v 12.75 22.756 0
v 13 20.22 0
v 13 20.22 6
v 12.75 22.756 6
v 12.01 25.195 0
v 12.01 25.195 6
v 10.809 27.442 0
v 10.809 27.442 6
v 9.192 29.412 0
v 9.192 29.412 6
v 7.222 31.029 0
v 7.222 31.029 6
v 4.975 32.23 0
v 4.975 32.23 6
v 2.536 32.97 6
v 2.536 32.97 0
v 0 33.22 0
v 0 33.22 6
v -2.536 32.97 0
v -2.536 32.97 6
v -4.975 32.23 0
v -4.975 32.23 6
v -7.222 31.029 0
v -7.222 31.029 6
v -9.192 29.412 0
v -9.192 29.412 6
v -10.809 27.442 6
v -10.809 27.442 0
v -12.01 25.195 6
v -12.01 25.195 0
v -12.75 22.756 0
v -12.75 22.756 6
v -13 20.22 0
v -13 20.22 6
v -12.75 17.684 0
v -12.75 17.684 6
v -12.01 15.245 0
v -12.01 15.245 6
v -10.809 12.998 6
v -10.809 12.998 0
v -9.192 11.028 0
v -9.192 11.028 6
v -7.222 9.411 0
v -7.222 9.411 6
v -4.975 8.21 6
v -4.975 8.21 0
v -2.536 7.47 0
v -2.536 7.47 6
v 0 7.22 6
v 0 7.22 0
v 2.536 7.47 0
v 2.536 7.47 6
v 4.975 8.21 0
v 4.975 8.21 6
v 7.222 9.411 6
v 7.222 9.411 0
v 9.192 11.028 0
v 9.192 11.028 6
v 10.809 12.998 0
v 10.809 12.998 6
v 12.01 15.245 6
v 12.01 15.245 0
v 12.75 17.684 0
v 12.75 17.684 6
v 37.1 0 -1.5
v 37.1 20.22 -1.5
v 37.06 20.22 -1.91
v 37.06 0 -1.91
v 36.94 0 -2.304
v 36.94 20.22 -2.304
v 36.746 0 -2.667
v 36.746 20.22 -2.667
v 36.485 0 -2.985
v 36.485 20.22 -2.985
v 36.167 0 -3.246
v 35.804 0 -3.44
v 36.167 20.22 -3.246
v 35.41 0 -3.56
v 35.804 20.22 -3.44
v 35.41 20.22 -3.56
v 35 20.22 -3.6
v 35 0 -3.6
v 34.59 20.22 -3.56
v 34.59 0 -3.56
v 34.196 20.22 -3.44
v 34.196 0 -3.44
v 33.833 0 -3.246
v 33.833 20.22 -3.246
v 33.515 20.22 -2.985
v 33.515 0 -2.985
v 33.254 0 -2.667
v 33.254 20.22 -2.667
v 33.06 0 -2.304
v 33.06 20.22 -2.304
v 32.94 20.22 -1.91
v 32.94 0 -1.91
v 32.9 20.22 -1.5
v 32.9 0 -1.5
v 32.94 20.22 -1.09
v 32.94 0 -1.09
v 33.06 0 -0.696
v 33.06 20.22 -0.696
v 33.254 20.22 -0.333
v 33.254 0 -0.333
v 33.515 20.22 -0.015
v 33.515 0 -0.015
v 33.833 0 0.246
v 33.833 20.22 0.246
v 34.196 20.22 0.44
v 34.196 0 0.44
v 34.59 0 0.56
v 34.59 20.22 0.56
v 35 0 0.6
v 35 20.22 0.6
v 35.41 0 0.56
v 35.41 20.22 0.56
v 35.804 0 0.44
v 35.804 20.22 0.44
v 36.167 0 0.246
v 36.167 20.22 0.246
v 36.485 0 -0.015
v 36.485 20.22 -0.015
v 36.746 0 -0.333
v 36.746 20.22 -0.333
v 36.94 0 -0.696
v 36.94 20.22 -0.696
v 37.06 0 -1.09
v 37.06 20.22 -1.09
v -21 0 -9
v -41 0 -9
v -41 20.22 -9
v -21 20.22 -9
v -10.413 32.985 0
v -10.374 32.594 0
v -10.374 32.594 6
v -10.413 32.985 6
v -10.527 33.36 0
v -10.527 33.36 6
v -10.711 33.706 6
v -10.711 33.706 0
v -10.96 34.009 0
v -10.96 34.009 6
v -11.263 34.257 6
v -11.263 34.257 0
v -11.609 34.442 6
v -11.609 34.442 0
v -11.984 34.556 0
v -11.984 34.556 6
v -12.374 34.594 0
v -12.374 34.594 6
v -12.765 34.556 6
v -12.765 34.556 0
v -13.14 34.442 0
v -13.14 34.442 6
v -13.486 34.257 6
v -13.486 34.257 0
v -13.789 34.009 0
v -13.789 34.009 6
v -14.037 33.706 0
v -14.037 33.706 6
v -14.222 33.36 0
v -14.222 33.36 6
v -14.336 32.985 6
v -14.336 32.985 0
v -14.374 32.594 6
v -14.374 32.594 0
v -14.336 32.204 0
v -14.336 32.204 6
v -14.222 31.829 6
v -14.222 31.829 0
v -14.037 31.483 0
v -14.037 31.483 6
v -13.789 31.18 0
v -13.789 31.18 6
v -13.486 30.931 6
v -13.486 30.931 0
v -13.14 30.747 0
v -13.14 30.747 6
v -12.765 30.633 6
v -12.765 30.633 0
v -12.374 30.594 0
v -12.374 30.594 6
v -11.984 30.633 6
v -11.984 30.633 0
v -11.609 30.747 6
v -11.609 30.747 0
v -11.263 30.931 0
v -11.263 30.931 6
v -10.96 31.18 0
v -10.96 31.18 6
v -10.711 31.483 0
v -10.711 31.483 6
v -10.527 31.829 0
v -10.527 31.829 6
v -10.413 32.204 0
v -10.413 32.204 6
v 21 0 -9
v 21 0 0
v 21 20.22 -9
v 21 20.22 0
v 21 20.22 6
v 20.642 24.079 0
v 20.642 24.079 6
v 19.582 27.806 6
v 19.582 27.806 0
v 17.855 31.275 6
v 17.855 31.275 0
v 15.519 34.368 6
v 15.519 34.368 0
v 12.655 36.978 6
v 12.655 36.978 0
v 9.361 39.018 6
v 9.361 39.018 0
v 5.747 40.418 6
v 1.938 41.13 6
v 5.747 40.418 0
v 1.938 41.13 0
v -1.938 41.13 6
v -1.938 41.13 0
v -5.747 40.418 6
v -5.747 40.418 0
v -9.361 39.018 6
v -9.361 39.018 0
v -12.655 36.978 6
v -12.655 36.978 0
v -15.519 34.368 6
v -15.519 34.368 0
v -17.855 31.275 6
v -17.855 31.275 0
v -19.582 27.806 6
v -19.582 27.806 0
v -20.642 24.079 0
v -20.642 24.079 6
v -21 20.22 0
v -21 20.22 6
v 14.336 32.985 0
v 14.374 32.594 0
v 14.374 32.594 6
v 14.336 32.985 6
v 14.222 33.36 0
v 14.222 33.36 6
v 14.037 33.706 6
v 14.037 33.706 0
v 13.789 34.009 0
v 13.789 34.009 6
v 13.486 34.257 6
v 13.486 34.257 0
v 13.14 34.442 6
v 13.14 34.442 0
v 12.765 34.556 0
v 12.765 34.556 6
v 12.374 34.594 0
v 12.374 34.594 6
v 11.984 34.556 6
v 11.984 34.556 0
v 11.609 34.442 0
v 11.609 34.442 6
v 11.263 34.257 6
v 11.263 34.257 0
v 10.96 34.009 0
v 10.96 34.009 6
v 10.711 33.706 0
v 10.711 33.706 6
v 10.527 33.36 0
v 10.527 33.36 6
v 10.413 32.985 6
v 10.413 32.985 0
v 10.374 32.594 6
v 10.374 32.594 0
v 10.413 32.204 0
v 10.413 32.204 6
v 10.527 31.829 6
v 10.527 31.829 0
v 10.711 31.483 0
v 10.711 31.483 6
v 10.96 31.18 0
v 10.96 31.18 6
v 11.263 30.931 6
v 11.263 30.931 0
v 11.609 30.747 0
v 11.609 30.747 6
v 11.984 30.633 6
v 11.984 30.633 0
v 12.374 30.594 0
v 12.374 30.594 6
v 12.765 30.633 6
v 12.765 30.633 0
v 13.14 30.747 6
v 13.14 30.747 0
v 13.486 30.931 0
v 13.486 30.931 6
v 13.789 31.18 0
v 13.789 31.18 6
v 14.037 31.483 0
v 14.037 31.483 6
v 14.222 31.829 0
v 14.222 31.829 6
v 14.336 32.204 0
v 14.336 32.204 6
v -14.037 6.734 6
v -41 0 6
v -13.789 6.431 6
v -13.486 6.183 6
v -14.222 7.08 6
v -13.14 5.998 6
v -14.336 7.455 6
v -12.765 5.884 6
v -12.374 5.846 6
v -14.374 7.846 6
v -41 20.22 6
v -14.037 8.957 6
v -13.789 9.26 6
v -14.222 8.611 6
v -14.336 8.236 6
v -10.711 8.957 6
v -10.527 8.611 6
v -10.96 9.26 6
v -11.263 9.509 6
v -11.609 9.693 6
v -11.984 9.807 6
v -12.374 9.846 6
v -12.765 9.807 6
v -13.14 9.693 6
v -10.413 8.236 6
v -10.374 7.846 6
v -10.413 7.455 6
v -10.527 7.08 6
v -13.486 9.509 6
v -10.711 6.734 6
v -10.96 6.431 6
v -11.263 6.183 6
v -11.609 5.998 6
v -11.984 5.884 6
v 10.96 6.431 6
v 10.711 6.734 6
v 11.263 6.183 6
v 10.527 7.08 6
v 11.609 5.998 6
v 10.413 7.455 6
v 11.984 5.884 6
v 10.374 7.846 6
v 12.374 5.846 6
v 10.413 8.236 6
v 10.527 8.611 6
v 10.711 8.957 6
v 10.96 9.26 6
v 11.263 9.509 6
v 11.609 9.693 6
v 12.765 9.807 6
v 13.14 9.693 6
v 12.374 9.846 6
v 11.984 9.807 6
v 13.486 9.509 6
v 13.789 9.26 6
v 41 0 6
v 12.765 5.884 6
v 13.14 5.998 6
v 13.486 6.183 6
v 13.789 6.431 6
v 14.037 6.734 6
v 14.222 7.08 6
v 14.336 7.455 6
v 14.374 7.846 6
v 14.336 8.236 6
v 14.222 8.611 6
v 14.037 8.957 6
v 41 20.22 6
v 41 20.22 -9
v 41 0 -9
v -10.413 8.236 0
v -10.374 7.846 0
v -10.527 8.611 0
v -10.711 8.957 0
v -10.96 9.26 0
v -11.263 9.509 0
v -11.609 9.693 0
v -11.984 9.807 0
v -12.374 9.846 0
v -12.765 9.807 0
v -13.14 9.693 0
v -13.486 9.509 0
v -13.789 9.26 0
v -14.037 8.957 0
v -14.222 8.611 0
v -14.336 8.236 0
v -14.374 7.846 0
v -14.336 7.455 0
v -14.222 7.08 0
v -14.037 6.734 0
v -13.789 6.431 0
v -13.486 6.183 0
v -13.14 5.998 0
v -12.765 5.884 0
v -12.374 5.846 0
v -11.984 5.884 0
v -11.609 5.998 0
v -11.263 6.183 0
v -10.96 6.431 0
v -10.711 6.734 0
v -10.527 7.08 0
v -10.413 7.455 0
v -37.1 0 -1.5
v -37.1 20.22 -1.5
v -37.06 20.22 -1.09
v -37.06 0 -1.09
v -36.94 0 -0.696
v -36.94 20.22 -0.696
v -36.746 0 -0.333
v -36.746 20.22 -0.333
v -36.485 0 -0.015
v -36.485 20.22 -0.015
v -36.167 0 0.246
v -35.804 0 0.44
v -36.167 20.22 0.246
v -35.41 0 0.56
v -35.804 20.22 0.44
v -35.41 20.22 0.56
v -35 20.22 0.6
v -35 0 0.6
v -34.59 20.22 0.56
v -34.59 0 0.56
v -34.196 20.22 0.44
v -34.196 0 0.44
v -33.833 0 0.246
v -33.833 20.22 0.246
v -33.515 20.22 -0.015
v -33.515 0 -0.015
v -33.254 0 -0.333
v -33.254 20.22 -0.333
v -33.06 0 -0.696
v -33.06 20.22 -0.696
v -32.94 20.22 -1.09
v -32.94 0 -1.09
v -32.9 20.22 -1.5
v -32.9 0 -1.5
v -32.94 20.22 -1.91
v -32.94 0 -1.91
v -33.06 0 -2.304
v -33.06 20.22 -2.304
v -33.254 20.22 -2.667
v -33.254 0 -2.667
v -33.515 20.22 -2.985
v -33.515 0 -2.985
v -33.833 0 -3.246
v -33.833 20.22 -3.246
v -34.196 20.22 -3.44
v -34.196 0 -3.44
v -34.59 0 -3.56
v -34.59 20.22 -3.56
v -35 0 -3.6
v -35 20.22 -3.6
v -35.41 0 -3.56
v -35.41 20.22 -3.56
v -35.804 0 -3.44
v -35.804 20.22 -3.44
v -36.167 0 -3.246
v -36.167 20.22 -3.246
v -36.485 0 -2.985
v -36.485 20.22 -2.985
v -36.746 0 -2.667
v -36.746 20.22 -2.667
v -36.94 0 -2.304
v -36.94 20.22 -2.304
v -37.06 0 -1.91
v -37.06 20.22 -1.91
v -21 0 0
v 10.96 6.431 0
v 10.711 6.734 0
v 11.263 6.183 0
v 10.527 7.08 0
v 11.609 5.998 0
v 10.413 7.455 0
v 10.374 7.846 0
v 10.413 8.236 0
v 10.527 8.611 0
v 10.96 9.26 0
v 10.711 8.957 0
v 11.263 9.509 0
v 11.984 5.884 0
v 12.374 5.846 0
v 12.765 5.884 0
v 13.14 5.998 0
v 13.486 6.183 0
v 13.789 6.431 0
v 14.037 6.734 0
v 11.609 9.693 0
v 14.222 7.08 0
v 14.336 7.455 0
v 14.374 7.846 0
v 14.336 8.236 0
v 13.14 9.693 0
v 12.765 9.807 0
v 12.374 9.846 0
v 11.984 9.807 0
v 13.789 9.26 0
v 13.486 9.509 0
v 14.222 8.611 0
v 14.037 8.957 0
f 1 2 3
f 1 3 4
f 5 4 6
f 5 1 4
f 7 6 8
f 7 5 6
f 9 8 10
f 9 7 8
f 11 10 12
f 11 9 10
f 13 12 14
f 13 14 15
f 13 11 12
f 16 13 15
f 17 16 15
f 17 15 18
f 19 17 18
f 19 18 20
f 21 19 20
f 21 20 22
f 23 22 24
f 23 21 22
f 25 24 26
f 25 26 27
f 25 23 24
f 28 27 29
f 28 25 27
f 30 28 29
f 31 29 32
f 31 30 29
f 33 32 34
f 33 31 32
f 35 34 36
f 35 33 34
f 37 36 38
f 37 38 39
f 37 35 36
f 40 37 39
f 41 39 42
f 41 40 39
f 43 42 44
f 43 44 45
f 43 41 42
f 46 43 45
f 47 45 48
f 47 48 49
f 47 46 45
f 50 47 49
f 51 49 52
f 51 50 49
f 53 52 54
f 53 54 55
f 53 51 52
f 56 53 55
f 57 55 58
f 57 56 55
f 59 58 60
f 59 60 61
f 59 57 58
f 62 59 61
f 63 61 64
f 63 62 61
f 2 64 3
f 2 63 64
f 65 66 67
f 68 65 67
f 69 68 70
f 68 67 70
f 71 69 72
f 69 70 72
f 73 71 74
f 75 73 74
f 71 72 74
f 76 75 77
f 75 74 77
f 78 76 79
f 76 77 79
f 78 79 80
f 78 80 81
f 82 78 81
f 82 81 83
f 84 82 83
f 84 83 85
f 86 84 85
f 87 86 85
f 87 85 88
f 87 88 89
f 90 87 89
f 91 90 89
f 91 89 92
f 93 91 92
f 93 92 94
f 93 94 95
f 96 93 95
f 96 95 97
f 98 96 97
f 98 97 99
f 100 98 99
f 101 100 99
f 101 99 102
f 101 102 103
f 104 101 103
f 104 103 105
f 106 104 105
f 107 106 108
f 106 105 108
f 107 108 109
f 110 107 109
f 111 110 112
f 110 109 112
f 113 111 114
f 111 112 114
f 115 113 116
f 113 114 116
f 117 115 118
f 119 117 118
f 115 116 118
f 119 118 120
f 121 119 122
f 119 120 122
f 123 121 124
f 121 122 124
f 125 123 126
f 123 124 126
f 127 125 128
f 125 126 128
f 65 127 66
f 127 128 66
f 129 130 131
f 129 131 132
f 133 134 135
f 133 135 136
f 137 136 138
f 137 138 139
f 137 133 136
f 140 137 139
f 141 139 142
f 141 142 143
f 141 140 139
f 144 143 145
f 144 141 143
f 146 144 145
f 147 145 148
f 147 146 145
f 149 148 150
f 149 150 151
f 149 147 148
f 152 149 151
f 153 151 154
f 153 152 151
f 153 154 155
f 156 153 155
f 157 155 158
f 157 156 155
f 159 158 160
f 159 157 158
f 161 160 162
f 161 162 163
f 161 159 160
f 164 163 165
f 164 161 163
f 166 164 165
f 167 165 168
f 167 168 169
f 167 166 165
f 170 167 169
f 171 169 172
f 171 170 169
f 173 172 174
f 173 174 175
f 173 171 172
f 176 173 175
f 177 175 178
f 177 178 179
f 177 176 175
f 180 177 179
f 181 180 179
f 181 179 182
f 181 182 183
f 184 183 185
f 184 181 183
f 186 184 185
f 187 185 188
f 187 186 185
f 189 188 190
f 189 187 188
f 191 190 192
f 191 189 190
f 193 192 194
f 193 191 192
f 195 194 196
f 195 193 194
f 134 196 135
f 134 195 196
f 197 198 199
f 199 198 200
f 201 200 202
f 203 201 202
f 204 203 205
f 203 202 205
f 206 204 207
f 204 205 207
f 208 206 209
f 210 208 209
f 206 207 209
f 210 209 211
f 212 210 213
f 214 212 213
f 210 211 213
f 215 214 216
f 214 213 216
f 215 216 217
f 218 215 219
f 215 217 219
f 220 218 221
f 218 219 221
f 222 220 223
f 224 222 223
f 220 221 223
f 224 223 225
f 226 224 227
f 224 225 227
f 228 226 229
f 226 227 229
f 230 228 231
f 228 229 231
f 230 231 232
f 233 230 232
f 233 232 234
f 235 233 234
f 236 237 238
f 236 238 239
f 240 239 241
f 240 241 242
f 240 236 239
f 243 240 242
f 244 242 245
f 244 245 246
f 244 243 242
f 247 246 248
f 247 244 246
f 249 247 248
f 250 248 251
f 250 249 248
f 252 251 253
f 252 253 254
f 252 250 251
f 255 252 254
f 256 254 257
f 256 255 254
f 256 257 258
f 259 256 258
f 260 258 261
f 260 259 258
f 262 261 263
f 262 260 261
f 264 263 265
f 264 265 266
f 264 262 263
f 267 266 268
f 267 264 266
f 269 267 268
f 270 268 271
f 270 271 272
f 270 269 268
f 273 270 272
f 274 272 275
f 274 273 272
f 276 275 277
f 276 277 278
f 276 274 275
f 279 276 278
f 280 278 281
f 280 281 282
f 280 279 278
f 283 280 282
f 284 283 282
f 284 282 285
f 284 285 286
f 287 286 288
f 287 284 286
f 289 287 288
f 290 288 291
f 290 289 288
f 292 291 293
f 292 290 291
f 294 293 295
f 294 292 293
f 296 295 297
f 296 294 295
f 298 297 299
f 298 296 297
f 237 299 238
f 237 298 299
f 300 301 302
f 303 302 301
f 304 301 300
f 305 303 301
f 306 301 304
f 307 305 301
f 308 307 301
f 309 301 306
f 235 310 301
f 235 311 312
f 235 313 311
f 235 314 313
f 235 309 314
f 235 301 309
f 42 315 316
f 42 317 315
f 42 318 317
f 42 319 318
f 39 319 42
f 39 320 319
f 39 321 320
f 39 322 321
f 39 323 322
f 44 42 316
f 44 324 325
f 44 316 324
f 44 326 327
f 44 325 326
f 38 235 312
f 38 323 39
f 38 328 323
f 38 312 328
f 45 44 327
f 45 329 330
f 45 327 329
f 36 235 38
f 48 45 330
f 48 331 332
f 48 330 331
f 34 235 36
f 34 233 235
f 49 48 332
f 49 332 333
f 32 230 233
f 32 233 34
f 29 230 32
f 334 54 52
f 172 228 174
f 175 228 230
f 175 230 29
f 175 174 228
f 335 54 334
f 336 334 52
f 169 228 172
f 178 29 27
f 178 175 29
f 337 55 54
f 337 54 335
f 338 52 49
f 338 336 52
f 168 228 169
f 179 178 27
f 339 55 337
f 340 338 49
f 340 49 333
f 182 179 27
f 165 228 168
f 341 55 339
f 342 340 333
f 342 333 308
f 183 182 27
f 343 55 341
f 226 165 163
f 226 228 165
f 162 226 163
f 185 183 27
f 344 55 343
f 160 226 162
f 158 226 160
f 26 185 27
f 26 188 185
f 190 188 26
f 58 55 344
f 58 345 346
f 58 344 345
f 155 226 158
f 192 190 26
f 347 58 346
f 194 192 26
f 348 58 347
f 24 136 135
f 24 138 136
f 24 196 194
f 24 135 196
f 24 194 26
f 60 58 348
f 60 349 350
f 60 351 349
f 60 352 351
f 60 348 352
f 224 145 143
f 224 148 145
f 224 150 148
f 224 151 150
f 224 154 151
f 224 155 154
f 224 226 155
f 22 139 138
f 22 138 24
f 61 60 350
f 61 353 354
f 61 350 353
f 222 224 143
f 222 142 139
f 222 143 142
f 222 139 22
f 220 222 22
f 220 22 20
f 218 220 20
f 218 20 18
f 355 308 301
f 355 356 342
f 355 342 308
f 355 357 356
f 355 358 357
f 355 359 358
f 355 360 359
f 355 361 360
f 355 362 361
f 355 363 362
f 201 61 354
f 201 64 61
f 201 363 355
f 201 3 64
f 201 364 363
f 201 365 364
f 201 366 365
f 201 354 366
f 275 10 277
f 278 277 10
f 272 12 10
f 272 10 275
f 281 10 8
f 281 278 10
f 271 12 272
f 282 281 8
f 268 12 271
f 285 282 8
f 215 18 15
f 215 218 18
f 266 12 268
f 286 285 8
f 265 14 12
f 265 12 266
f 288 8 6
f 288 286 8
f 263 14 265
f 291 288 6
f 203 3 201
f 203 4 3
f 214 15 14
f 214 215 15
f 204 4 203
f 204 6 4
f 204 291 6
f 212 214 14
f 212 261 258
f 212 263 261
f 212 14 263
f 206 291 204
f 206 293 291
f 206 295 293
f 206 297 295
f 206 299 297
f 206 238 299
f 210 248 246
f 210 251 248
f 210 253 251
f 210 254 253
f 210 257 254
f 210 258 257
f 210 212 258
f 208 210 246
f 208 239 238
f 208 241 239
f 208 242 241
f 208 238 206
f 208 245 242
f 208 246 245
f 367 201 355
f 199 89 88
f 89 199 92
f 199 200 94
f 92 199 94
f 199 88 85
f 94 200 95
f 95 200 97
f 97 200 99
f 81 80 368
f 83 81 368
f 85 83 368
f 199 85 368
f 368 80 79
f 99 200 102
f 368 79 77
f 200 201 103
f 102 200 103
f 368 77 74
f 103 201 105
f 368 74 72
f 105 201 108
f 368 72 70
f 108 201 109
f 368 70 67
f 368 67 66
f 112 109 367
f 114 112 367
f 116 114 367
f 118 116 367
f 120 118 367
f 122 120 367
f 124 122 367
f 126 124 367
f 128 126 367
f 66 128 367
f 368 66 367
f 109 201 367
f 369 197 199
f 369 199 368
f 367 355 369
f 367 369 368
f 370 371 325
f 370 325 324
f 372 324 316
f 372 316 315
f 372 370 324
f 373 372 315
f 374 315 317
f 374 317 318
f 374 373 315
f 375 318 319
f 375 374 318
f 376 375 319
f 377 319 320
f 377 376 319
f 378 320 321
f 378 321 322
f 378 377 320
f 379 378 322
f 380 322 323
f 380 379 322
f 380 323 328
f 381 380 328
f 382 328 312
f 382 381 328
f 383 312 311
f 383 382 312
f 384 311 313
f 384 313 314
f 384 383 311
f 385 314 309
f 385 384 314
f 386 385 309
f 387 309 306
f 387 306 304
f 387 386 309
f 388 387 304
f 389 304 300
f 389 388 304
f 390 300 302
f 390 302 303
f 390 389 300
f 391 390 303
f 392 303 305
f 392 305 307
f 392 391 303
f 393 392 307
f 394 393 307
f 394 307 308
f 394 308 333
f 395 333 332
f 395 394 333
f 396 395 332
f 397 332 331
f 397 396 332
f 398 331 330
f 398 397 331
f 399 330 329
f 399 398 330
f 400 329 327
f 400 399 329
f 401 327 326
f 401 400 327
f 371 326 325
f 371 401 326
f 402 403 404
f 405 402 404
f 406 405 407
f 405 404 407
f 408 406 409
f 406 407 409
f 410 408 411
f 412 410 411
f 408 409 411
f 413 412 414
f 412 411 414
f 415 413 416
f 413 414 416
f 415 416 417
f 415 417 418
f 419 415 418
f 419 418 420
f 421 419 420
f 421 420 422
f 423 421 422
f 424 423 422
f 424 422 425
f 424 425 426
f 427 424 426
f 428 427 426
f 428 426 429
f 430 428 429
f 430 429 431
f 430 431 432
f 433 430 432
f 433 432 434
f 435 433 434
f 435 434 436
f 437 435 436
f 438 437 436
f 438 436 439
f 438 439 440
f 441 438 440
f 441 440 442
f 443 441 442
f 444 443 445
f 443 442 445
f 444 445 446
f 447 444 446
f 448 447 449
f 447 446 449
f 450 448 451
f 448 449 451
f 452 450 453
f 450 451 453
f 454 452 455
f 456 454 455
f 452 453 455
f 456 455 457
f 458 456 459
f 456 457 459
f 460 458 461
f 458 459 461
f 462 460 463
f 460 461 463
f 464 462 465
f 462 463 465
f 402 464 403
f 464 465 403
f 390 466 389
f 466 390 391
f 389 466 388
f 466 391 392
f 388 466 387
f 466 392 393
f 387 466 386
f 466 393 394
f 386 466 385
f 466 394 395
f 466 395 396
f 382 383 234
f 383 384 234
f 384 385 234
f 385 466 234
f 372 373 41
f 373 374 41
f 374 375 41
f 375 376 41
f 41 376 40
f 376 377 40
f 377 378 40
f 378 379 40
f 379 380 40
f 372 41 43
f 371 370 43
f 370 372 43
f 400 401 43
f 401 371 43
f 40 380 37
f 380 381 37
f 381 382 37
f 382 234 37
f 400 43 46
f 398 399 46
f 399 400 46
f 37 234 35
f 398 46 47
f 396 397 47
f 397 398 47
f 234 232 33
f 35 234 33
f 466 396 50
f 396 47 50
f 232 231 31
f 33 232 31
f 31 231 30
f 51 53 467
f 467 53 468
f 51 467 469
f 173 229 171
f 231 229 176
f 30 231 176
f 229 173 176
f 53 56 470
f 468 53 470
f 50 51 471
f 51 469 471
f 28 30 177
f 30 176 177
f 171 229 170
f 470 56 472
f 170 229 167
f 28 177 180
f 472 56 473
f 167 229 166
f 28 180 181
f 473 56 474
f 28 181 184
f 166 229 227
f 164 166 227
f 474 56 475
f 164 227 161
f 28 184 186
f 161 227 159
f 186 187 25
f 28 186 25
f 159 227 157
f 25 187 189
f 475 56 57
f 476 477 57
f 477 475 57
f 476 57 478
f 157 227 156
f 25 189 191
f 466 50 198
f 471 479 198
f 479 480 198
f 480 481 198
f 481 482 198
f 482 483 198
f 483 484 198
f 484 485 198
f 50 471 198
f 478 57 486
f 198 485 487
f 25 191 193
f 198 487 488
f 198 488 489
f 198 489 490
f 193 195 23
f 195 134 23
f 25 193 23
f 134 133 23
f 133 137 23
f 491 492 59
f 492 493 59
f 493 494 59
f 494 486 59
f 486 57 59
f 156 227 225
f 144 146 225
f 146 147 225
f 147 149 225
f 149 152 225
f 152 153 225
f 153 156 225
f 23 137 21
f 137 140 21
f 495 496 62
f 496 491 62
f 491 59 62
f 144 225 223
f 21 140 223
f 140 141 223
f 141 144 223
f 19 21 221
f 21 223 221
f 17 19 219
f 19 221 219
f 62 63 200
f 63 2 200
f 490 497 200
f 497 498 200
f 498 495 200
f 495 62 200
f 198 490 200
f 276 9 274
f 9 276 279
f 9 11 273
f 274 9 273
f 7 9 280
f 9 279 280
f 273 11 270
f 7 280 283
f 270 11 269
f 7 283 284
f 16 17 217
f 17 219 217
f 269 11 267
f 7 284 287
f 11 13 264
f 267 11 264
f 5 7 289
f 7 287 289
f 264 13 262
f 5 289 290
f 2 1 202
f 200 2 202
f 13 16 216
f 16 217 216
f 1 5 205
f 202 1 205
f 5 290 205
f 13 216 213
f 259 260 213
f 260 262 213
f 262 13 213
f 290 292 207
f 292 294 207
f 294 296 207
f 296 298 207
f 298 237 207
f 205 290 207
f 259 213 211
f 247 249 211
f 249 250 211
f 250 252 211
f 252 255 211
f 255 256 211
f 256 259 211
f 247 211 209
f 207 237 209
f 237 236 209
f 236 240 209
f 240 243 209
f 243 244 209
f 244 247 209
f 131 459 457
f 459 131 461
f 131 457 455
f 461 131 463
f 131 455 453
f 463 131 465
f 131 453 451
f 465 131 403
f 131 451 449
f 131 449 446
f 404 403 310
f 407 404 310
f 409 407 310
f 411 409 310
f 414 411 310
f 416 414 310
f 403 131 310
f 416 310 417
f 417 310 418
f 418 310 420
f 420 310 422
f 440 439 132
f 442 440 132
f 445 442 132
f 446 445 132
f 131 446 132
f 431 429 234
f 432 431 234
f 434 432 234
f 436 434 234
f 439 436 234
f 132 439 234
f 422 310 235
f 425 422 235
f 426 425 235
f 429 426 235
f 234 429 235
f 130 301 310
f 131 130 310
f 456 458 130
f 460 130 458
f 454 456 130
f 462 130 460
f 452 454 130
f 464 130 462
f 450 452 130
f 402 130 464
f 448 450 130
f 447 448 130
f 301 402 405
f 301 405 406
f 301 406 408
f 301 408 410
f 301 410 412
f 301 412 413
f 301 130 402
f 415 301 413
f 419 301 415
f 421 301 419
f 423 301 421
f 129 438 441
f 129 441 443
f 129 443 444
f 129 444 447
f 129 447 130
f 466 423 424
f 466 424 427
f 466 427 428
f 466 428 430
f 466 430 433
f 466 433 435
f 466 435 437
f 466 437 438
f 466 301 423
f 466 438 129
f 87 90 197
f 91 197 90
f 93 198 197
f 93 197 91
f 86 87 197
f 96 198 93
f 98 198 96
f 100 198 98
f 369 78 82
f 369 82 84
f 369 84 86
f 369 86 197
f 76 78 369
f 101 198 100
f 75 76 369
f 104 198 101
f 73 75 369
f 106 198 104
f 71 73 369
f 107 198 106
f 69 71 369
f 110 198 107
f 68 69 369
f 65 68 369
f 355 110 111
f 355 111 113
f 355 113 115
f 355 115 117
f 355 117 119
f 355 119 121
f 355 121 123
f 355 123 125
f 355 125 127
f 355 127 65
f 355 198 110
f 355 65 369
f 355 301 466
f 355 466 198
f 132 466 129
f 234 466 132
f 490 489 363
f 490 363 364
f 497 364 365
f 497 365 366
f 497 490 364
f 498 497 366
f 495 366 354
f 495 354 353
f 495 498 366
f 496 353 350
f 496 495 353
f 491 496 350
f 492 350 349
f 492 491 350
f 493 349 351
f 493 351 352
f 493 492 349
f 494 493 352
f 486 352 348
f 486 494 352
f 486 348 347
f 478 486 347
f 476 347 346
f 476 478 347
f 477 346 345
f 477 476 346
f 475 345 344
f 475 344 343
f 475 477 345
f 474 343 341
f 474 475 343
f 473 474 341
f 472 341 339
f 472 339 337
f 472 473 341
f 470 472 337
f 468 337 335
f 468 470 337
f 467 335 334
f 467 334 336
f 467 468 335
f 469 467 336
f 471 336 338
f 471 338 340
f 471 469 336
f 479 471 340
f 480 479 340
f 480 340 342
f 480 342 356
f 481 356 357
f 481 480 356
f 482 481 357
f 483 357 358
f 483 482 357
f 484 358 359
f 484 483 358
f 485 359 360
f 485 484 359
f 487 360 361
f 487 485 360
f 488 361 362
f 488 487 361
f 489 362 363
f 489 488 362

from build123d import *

# Parameters (mm, degrees)
SKETCH_1_R          = 13
SKETCH_1_R_2        = 2
EXTRUDE_1_DEPTH     = 6
SKETCH_2_W          = 20
SKETCH_2_H          = 20.22
EXTRUDE_2_DEPTH     = 15
SKETCH_3_R          = 2.1
CUT_EXTRUDE_1_DEPTH = 47.936126811


with BuildPart() as part:
    # 草图1 → 凸台-拉伸1 (new body)
    with BuildSketch(Plane.XY):
        with BuildLine():
            Line((-21, 20.22), (-21, 0))
            Line((-21, 0), (21, 0))
            Line((21, 0), (21, 20.22))
            ThreePointArc((21, 20.22), (0, 41.22), (-21, 20.22))
        make_face()
        with Locations((0, 20.22)):
            Circle(SKETCH_1_R, mode=Mode.SUBTRACT)
        with Locations((-12.374368671, 32.594368671)):
            Circle(SKETCH_1_R_2, mode=Mode.SUBTRACT)
        with Locations((12.374368671, 32.594368671)):
            Circle(SKETCH_1_R_2, mode=Mode.SUBTRACT)
        with Locations((12.374368671, 7.845631329)):
            Circle(SKETCH_1_R_2, mode=Mode.SUBTRACT)
        with Locations((-12.374368671, 7.845631329)):
            Circle(SKETCH_1_R_2, mode=Mode.SUBTRACT)
    extrude(amount=EXTRUDE_1_DEPTH)

    # 草图2 → 凸台-拉伸2 (add)
    with BuildSketch(Plane.XY.offset(6)):
        with Locations((-31, 10.11)):
            Rectangle(SKETCH_2_W, SKETCH_2_H)
        with Locations((31, 10.11)):
            Rectangle(SKETCH_2_W, SKETCH_2_H)
    extrude(amount=-EXTRUDE_2_DEPTH)

    # 草图3 → 切除-拉伸1 (cut, through all)
    with BuildSketch(Plane(origin=(0, 20.22, 0), x_dir=(1, 0, 0), z_dir=(0, 1, 0))):
        with Locations(Location((-35, 1.5, 0), (0, 0, 180))):
            Circle(SKETCH_3_R)
        with Locations((35, 1.5)):
            Circle(SKETCH_3_R)
    extrude(amount=-CUT_EXTRUDE_1_DEPTH, mode=Mode.SUBTRACT)


solid = part.part
